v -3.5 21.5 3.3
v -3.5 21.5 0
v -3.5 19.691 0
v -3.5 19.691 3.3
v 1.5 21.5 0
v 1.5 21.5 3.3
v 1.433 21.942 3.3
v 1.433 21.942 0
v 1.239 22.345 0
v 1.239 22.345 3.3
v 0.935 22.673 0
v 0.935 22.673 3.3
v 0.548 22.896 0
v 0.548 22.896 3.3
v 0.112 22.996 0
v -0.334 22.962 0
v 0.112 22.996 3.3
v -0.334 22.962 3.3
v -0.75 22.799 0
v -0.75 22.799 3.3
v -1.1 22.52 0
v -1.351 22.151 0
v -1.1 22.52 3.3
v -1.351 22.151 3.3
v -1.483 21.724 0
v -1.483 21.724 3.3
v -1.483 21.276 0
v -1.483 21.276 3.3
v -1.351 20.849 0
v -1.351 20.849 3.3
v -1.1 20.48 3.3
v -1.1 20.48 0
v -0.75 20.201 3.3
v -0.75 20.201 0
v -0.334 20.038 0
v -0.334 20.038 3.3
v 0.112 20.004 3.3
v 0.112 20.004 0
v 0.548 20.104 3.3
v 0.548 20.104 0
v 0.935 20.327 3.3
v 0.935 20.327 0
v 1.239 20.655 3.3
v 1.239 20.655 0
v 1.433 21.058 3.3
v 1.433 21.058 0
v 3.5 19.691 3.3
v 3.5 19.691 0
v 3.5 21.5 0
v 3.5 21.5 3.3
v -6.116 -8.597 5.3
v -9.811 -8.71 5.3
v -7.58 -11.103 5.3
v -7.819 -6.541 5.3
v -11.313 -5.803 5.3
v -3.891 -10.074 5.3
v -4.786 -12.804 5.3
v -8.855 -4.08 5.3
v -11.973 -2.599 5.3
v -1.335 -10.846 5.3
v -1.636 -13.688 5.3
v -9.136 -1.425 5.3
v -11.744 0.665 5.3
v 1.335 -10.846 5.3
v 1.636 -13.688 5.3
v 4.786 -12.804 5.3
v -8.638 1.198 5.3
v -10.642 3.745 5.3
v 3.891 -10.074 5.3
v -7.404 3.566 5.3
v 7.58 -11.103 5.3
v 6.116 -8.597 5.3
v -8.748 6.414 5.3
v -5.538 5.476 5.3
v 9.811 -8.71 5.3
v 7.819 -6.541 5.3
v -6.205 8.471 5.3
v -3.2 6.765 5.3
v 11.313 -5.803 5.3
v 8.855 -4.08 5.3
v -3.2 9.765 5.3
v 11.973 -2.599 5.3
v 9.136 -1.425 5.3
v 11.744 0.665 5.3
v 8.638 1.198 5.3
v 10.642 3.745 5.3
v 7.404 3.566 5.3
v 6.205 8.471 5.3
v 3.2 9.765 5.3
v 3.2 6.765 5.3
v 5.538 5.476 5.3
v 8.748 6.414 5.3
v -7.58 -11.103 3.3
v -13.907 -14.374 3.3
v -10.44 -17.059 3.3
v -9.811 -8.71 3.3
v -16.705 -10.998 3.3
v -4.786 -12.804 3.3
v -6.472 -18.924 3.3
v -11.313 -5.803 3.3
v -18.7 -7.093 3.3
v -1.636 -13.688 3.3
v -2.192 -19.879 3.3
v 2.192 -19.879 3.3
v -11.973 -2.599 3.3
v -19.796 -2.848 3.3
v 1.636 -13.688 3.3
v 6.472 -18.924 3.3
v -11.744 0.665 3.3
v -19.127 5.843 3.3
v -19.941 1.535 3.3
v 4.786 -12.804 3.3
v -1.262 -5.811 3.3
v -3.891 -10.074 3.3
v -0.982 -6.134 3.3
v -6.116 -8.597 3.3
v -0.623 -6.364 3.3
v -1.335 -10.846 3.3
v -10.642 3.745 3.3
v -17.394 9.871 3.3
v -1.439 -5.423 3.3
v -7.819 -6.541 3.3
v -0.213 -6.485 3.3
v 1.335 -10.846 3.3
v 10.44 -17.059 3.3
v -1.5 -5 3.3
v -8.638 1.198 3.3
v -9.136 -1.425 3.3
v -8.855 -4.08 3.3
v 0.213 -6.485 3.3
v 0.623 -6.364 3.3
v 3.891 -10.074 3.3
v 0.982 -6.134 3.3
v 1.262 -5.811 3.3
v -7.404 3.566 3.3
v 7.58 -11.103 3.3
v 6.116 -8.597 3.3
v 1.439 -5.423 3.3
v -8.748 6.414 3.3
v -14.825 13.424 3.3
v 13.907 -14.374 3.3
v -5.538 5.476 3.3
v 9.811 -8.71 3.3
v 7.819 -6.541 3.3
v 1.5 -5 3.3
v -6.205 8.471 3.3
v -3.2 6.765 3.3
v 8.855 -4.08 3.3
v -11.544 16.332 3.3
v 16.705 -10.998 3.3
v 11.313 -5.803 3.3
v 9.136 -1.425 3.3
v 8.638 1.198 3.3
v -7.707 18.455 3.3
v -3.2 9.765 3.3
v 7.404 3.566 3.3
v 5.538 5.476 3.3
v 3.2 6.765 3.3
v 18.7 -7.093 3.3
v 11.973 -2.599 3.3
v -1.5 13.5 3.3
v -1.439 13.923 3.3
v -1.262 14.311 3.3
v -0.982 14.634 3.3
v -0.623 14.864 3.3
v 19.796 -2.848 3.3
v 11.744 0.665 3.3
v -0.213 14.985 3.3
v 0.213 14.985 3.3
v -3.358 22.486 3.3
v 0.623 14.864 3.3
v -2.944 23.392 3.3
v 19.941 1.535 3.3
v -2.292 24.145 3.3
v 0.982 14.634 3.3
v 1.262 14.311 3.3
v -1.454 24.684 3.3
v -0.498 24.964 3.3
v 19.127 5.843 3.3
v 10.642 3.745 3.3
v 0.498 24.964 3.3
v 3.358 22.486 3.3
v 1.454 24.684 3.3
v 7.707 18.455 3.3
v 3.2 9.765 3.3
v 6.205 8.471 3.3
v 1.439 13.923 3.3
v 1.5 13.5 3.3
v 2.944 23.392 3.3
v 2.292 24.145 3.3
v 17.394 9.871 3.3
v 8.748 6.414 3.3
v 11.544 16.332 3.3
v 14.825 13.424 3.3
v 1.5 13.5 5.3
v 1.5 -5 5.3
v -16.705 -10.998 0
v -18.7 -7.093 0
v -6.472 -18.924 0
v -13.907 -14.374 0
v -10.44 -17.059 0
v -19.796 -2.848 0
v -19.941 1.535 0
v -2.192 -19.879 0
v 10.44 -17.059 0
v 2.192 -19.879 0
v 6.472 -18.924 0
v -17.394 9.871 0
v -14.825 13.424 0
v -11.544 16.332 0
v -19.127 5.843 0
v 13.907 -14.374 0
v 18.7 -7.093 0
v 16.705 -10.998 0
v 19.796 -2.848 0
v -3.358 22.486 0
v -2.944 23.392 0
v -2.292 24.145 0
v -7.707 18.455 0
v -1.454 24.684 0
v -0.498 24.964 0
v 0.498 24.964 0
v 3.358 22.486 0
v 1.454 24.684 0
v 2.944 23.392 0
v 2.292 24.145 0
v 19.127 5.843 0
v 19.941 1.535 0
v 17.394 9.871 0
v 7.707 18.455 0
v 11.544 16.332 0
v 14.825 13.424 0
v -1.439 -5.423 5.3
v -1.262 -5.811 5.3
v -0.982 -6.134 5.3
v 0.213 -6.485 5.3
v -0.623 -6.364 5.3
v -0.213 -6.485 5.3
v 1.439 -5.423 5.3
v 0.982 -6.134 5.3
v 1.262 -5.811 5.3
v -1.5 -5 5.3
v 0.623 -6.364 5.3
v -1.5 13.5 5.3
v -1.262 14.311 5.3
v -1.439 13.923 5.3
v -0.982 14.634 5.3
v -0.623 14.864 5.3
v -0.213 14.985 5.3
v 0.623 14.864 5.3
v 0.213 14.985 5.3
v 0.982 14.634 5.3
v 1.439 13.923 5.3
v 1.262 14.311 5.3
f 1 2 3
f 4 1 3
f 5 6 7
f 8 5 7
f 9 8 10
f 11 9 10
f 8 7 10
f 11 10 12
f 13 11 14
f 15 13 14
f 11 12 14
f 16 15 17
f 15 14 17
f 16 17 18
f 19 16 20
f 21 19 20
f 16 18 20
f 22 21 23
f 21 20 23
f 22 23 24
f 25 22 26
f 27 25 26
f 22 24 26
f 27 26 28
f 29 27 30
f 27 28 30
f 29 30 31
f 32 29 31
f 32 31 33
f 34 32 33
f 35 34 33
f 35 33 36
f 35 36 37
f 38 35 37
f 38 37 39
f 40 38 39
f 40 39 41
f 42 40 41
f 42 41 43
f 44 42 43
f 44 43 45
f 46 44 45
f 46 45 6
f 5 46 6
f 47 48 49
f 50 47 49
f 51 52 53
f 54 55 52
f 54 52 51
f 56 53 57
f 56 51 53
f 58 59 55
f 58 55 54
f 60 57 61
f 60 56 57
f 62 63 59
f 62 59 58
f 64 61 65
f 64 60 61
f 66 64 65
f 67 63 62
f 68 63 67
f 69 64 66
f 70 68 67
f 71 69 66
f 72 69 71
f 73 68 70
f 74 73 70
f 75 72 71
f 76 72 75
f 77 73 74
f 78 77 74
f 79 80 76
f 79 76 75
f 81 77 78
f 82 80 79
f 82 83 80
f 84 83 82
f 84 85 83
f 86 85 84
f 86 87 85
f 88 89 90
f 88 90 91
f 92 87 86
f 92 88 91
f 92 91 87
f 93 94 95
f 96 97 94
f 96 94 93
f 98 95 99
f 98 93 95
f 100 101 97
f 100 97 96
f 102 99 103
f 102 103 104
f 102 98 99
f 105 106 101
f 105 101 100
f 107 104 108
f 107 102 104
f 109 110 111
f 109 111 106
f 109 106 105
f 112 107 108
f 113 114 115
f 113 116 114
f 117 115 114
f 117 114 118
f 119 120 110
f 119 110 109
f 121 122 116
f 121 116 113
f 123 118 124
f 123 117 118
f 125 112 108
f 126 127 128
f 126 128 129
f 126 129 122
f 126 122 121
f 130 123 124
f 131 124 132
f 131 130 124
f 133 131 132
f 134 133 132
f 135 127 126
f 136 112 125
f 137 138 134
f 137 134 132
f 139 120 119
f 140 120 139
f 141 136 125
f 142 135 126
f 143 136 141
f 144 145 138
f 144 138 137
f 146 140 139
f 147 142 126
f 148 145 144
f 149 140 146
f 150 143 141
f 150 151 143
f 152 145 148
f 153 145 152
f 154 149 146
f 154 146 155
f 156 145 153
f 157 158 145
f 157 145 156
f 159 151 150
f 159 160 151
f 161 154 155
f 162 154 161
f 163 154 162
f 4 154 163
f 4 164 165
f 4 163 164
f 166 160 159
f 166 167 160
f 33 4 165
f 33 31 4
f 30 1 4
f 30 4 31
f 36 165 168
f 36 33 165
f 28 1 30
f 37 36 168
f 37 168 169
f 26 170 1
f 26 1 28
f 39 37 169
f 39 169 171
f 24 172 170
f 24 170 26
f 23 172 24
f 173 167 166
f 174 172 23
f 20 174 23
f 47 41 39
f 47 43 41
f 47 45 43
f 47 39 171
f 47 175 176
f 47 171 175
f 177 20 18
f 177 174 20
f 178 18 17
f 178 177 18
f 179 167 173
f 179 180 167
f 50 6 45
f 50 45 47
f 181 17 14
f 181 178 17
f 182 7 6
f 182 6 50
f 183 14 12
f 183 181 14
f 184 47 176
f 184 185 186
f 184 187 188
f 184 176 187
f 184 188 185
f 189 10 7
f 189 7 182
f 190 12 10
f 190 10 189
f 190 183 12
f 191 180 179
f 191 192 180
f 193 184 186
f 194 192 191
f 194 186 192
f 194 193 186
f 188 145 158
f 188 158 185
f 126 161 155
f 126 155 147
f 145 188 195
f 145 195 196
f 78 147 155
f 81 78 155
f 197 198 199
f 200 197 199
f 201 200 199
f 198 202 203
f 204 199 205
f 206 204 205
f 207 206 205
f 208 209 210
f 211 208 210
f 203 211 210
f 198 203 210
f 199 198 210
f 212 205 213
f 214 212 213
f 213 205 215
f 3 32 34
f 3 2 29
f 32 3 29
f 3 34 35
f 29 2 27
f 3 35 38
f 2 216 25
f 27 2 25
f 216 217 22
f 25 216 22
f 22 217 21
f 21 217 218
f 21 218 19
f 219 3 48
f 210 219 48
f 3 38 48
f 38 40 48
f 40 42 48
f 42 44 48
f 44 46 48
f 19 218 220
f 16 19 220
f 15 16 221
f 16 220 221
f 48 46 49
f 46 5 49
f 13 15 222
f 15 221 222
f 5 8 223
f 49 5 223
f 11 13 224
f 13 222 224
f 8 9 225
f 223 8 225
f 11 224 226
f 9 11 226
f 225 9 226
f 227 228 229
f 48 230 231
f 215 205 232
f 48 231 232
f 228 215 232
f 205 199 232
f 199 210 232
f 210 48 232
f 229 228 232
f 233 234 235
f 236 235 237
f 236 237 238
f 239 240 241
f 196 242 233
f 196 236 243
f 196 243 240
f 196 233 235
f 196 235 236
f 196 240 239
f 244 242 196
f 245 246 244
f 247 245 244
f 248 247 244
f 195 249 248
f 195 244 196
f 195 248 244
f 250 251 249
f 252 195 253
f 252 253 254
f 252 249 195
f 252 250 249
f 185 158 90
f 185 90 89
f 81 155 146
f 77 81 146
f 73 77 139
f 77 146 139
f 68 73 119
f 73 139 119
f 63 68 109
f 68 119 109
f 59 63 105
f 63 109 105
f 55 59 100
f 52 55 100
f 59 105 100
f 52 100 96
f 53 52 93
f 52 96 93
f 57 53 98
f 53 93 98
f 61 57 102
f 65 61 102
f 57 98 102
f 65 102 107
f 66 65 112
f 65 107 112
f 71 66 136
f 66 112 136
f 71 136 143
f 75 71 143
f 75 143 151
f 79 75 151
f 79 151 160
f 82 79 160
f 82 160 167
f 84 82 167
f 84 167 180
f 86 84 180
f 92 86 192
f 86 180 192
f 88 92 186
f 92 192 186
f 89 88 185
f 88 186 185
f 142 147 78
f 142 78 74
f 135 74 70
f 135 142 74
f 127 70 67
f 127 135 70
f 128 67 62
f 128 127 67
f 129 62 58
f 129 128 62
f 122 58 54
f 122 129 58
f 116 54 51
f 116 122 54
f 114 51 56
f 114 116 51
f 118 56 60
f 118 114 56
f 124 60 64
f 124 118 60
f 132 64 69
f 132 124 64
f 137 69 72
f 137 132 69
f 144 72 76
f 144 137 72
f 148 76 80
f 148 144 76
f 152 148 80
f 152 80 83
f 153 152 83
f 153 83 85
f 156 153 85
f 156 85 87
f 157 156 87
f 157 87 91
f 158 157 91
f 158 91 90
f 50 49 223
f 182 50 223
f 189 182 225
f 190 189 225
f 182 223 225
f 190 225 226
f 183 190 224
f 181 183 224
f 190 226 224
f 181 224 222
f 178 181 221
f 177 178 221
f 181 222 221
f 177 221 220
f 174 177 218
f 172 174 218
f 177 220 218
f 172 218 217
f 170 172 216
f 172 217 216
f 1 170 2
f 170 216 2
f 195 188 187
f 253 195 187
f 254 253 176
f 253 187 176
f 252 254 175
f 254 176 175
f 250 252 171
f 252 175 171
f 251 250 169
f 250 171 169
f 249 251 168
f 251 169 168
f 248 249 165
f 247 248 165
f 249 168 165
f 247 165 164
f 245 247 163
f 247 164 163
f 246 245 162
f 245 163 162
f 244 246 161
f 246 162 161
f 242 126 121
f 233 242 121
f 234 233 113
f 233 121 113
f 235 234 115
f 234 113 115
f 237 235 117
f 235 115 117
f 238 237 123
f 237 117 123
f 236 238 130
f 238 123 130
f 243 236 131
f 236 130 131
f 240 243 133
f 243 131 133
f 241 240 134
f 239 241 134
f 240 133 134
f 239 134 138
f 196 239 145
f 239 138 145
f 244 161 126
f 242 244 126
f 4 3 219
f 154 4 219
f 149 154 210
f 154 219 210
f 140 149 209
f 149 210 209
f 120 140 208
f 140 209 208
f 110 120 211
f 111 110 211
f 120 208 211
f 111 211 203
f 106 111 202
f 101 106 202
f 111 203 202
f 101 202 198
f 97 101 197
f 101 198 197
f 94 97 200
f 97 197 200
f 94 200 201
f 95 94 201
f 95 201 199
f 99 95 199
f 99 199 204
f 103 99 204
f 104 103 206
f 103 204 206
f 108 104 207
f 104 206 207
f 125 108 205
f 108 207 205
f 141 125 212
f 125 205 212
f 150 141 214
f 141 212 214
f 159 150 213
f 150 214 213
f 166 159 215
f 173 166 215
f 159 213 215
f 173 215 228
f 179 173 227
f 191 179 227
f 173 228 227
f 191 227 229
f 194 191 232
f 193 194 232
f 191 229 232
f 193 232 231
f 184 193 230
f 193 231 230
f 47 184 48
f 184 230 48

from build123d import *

# Parameters (mm, degrees)
EXTRUDE_DEPTH = 3.3
SKETCH001_R   = 1.5
POCKET_DEPTH  = 3.301
PAD_DEPTH     = 2


with BuildPart() as part:
    # Sketch → Extrude (new body)
    with BuildSketch(Plane.XY):
        with BuildLine():
            ThreePointArc((3.5, 21.5), (0, 25), (-3.5, 21.5))
            Line((-3.5, 21.5), (-3.5, 19.691369))
            ThreePointArc((-3.5, 19.691369), (0, -20), (3.5, 19.691369))
            Line((3.5, 19.691369), (3.5, 21.5))
        make_face()
    extrude(amount=EXTRUDE_DEPTH)

    # Sketch001 → Pocket (cut, through all)
    with BuildSketch(Plane.XY.offset(3.3)):
        with Locations((0, 21.5)):
            Circle(SKETCH001_R)
    extrude(amount=-POCKET_DEPTH, mode=Mode.SUBTRACT)

    # Sketch002 → Pad (new body)
    with BuildSketch(Plane.XY.offset(3.3)):
        with BuildLine():
            ThreePointArc((1.5, 13.500001), (0, 15), (-1.5, 13.5))
            Line((-1.5, 13.5), (-1.5, -5))
            ThreePointArc((-1.5, -5), (0, -6.5), (1.5, -4.999999))
            Line((1.5, 13.500001), (1.5, -4.999999))
        make_face()
        with BuildLine():
            Line((-3.2, 6.765466), (-3.2, 9.765466))
            ThreePointArc((-3.2, 9.765466), (0, -13.8), (3.2, 9.765466))
            Line((3.2, 6.765466), (3.2, 9.765466))
            ThreePointArc((-3.2, 6.765466), (0, -10.943698), (3.2, 6.765466))
        make_face()
    extrude(amount=PAD_DEPTH)


solid = part.part
